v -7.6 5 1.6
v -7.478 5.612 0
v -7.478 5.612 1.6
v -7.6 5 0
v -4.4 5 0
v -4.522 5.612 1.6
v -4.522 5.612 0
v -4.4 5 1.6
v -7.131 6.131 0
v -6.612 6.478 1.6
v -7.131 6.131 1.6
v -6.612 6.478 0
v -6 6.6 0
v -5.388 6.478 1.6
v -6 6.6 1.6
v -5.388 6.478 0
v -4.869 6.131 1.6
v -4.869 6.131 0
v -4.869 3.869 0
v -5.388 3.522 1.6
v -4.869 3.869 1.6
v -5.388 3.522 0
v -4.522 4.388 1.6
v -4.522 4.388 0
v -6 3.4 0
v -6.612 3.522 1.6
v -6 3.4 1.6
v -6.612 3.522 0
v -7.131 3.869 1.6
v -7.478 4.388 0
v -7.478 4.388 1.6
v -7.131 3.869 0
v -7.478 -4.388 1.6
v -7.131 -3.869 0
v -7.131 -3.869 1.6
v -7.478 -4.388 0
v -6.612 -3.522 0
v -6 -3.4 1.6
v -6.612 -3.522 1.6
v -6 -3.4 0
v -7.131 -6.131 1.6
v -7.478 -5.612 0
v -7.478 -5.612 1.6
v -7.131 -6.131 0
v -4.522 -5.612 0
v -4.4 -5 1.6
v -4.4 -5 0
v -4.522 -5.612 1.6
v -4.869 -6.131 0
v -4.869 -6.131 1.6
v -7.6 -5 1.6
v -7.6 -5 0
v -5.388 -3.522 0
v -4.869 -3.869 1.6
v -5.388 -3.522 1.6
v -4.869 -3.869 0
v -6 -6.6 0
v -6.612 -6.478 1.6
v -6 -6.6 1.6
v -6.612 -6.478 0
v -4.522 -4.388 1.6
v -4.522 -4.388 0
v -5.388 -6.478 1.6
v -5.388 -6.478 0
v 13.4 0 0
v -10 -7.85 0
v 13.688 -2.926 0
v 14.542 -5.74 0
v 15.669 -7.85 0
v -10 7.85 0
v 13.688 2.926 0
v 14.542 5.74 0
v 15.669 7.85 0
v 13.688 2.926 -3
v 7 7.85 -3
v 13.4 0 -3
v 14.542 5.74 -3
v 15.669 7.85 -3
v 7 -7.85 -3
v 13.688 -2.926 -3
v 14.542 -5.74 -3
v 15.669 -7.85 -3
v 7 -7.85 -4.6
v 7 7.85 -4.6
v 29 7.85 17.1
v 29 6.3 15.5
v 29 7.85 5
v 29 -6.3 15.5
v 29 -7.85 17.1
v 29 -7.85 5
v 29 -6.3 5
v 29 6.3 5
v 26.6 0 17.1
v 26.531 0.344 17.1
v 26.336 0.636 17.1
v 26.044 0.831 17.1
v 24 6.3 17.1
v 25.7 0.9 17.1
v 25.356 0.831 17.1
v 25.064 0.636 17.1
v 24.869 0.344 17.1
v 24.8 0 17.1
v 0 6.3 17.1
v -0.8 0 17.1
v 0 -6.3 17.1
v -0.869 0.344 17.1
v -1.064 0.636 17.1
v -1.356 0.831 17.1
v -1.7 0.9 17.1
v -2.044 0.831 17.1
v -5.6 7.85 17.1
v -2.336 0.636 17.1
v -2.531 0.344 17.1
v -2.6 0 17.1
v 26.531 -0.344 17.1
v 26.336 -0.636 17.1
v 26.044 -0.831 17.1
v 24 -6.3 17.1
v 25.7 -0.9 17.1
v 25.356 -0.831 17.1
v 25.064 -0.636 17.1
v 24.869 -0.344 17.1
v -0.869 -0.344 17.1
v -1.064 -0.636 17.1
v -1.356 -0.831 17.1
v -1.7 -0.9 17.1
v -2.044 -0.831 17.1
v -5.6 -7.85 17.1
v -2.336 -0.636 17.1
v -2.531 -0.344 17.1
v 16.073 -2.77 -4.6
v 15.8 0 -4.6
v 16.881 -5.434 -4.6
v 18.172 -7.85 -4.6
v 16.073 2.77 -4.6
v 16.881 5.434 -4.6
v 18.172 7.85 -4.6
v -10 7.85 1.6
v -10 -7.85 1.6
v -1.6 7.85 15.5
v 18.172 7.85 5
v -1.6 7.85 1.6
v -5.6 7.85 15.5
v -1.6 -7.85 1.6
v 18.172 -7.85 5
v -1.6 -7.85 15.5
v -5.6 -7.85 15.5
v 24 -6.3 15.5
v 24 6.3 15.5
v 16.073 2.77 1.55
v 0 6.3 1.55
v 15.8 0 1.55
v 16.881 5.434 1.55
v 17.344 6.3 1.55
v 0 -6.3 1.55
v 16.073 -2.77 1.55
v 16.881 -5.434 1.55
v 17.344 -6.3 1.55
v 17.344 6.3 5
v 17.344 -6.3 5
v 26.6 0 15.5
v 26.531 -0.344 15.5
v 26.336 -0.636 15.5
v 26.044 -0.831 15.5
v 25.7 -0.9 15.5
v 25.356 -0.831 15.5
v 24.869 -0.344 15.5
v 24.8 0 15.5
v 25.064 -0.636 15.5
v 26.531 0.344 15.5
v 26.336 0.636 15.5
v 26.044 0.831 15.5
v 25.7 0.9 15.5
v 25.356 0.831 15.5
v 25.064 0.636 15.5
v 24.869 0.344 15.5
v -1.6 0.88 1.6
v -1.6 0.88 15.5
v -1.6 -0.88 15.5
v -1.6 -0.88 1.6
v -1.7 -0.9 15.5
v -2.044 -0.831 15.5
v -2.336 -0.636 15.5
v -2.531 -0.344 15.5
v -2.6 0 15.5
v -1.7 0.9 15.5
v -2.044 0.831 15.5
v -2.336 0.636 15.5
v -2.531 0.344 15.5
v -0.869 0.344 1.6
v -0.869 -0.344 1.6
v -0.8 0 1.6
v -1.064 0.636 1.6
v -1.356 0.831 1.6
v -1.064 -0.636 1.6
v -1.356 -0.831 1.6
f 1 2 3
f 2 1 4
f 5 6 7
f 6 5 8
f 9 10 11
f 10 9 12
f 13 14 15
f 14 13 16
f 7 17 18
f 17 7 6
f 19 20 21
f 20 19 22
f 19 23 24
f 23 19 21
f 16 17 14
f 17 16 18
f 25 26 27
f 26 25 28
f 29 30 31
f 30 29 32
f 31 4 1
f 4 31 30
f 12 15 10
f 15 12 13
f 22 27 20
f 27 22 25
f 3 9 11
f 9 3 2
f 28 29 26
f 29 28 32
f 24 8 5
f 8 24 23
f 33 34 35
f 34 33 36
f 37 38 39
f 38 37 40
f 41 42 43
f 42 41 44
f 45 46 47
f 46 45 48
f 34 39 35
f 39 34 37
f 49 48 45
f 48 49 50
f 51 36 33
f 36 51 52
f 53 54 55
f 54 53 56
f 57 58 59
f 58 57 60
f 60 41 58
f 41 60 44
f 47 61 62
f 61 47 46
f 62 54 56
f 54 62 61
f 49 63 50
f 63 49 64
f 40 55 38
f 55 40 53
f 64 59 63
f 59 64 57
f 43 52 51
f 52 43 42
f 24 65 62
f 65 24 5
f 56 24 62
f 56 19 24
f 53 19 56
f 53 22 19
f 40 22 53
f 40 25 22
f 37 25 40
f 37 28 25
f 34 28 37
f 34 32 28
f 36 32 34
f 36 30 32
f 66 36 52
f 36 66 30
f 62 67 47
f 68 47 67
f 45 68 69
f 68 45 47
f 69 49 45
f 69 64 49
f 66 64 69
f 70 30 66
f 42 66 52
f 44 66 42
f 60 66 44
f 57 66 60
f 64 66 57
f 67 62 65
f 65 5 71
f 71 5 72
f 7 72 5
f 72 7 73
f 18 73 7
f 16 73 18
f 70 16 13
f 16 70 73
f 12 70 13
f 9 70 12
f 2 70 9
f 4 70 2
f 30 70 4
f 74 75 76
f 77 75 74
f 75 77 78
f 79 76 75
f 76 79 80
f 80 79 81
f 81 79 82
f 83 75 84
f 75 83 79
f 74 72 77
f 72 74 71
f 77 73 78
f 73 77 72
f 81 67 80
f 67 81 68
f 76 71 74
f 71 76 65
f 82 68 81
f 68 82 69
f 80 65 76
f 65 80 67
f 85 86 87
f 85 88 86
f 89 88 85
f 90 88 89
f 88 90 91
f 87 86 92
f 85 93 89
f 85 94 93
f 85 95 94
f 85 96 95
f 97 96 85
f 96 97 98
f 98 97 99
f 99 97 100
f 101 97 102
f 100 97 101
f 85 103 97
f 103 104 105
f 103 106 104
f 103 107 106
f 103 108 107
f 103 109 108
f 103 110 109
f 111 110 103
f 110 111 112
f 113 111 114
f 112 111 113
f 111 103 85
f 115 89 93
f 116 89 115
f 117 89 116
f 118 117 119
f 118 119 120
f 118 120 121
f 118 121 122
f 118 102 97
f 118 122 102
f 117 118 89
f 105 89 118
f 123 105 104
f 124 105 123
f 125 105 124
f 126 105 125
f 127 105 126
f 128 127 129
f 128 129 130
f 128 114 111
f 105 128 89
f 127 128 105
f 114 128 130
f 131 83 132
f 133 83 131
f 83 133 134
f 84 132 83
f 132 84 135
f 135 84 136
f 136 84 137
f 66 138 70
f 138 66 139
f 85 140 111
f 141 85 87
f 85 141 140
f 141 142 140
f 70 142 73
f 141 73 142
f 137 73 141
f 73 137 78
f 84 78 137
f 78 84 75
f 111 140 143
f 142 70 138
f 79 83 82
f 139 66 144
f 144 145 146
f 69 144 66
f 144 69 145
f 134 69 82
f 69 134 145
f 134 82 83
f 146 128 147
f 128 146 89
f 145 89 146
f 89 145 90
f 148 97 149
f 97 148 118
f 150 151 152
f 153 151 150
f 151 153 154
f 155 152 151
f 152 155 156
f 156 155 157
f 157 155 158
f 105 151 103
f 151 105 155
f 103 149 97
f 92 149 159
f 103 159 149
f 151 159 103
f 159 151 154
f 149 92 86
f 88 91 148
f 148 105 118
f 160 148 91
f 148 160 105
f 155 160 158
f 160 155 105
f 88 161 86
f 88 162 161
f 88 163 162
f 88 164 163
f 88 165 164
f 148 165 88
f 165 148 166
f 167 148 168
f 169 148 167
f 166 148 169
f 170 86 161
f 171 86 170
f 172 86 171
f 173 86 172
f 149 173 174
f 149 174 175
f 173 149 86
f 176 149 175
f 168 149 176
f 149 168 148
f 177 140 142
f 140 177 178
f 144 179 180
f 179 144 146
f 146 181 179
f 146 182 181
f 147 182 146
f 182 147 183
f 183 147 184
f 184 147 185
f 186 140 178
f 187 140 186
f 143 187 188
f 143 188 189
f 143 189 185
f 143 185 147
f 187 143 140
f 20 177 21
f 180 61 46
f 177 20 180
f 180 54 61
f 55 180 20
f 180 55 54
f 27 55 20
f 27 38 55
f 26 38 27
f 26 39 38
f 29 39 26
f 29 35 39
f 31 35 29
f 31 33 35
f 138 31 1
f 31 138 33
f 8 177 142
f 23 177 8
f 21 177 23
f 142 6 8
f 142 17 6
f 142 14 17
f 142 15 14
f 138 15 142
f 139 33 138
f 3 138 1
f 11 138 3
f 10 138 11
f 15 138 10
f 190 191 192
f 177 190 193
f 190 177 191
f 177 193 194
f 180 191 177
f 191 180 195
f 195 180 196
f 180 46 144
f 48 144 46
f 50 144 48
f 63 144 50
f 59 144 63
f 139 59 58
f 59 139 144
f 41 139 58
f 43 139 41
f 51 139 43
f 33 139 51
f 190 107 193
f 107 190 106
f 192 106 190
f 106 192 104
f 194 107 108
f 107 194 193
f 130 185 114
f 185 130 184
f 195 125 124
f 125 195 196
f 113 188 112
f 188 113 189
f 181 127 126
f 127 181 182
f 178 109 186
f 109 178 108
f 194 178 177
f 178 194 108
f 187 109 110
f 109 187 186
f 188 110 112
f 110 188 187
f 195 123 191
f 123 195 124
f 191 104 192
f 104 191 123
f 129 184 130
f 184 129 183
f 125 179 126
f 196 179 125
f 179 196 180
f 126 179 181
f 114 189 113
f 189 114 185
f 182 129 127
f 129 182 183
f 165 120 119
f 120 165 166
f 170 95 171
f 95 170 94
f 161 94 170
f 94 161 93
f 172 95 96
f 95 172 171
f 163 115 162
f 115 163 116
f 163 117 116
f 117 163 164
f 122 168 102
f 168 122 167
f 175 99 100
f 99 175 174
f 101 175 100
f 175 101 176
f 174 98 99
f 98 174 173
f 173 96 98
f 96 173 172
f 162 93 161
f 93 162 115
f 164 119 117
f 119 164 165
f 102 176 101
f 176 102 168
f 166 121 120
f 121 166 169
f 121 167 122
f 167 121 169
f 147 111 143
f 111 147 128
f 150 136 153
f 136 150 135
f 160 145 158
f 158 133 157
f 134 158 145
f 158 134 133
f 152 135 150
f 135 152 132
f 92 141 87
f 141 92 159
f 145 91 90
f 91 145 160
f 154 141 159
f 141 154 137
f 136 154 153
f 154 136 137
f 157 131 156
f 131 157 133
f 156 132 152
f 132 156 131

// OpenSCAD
// file: syms.scad
module symY(t) {
    translate(t)
        children();
    mirror([0,1,0])
        translate(t)
            children();
}
module symX(t) {
    translate(t)
        children();
    mirror([1,0,0])
        translate(t)
            children();
}

module	symXY(t) {
	tx=t[0];
	ty=t[1];
	tz=t[2];
	symX([tx,0,0])
	symY([0,ty,tz])
		children();
}
// main file
// notes:
//	* all plexi holes: fill up the remaining part of the 4mm hole somehow; there is too much play
//	* servo_mount: add hook into plexi to prevent pitch
//	* arduino mount: add more holes for board - it can came out...
//	* stepdown: remove overhang; probably change orientation
//


include <syms.scad>
//include <9g_servo.scad>

HOLE_D=4;


module plexiHole() {
    //HOLE_D in plexi; but use M3
    $fn=16;
    cylinder(d=3.2,h=16,center=true);
}
module plexiHole0() {
    //HOLE_D in plexi; but use M3
    $fn=16;
    cylinder(d=4,h=16,center=true);
}

module servo_mount() {
    SERVO_W=12.5;
    SERVO_H=15.5;
    SERVO_L=23+1;
    SERVO_HOLE_X=(27.4-SERVO_L)/2;
    W=1.6;
    L=39;
    PW=3;
    
    $fn=16;
    
    difference() {
        translate([L/2-2.5*HOLE_D,0,(SERVO_H+W)/2-(PW+W)/2])
        cube([L,SERVO_W+2*W,SERVO_H+W+PW+W],center=true);
    
        translate([SERVO_L/2,0,SERVO_H/2+W])
        cube([SERVO_L,SERVO_W+.1,SERVO_H+.1],center=true);
        
        translate([L/2,0,(SERVO_H-W)/2+W])
        cube([L,SERVO_W+.1,SERVO_H-W],center=true);
    
        translate([-L/2-W,0,(SERVO_H-W)/2+W])
        cube([L,L,SERVO_H-W],center=true);
    
        translate([-SERVO_HOLE_X,0,SERVO_H+W])
        cylinder(d=1.8,h=SERVO_H*2,center=true);
        translate([SERVO_L+SERVO_HOLE_X,0,SERVO_H+W])
        cylinder(d=1.8,h=SERVO_H*2,center=true);
    
        
//        translate([L/2,0,SERVO_H])
  //  rotate(40,[0,1,0])
    //    cube([2*L,L,L/2],center=true);

        translate([-HOLE_D-W-L/2,0,L/2+W])
        cube([L,L,L],center=true);
    
    
    H_X=-1.5*HOLE_D;
        translate([H_X,0,0])
        symY([0,(6+HOLE_D)/2,0]) {
            plexiHole();
        }
        
        difference() {
            union() {
            translate([0,0,-PW/2])
            cube([100,100,PW],center=true);
            translate([-3,0,-10])
            cube(20,center=true);
            }
            translate([H_X+HOLE_D/2+2.7+4+9.7+30/2+1,0,0])
            cylinder($fn=32,d=30,h=100,center=true);
            
      //      translate([H_X,0,0])
    //        symY([0,(6+HOLE_D)/2,0]) {
  //              plexiHole0();
//            }

        }
        
        translate([H_X+HOLE_D/2+2.7+4+9.7+30/2+1+W,0,0])
        cylinder($fn=32,d=30-W,h=10,center=true);
        
        
    }
    
    
//    translate([0,0,1/2])
  //  9g_motor();
}

module stepdown_mount() {
    W=1.6;
    S=60.4;
    D2=3.2;
    
    difference() {
        cube([4*HOLE_D+W,S+2*D2+2*W,3*W],center=true);
        
        M=200;
        translate([W/2,-M/2,0])
        cube([M,M,M]);
        
        translate([-M-W/2,-M/2,-M])
        cube([M,M,M]);
        
        symY([W/2+HOLE_D,(6+HOLE_D)/2,0]) {
            plexiHole();
        }
        
        symY([-W/2-HOLE_D,(S+D2)/2,0]) {
            $fn=16;cylinder(d=D2,center=true,h=32);
        }
    }
}

module board_mount() {
    W=1.6;
    S=60.4;
    D2=3.2;
    H1=4*W;
    H2=5*W;
    
    L=50;
    B_W=53;
    
    
    Y1=20+HOLE_D/2;
    Y2=Y1+22+HOLE_D;
    XX2=34+HOLE_D;

    X1=(L-XX2)/2;
    X2=X1+XX2;

    
    difference() {
        translate([0,0,H2/2])
        cube([L,B_W+2*W,H2],center=true);
        
        translate([0,0,H2/2+H1])
        cube([L+1,B_W,H2],center=true);
        
        translate([0,0,H2/2+W])
        cube([L+1,B_W-2*1.5,H2],center=true);

        translate([L/2,-B_W/2,0]) {
            // top left corner
            translate([-X1,Y1,0])    plexiHole();
            translate([-X1,Y2,0])    plexiHole();
            translate([-X2,Y2,0])    plexiHole();
       //     plexiHole();
            
        }
    }
        translate([L/2-X1,-B_W/2,0]) {
            // top left corner
            DF=3.2;
            C1=5.8+DF/2;
            C2=33.7+DF/2;
            for(x=[C1,C2]) 
            translate([0,x,0]) {
                $fn=16;
                difference() {
                cylinder(d=6,h=H1);
                cylinder(d=2.8,h=H1*2);
                }
            }
        }
    
}



mode="board_mount";
mode="stepdown_mount";
mode="servo_mount";
if(mode=="servo_mount"){
    servo_mount();
}

if(mode=="stepdown_mount"){
    stepdown_mount();
}

if(mode=="board_mount"){
    board_mount();
}
